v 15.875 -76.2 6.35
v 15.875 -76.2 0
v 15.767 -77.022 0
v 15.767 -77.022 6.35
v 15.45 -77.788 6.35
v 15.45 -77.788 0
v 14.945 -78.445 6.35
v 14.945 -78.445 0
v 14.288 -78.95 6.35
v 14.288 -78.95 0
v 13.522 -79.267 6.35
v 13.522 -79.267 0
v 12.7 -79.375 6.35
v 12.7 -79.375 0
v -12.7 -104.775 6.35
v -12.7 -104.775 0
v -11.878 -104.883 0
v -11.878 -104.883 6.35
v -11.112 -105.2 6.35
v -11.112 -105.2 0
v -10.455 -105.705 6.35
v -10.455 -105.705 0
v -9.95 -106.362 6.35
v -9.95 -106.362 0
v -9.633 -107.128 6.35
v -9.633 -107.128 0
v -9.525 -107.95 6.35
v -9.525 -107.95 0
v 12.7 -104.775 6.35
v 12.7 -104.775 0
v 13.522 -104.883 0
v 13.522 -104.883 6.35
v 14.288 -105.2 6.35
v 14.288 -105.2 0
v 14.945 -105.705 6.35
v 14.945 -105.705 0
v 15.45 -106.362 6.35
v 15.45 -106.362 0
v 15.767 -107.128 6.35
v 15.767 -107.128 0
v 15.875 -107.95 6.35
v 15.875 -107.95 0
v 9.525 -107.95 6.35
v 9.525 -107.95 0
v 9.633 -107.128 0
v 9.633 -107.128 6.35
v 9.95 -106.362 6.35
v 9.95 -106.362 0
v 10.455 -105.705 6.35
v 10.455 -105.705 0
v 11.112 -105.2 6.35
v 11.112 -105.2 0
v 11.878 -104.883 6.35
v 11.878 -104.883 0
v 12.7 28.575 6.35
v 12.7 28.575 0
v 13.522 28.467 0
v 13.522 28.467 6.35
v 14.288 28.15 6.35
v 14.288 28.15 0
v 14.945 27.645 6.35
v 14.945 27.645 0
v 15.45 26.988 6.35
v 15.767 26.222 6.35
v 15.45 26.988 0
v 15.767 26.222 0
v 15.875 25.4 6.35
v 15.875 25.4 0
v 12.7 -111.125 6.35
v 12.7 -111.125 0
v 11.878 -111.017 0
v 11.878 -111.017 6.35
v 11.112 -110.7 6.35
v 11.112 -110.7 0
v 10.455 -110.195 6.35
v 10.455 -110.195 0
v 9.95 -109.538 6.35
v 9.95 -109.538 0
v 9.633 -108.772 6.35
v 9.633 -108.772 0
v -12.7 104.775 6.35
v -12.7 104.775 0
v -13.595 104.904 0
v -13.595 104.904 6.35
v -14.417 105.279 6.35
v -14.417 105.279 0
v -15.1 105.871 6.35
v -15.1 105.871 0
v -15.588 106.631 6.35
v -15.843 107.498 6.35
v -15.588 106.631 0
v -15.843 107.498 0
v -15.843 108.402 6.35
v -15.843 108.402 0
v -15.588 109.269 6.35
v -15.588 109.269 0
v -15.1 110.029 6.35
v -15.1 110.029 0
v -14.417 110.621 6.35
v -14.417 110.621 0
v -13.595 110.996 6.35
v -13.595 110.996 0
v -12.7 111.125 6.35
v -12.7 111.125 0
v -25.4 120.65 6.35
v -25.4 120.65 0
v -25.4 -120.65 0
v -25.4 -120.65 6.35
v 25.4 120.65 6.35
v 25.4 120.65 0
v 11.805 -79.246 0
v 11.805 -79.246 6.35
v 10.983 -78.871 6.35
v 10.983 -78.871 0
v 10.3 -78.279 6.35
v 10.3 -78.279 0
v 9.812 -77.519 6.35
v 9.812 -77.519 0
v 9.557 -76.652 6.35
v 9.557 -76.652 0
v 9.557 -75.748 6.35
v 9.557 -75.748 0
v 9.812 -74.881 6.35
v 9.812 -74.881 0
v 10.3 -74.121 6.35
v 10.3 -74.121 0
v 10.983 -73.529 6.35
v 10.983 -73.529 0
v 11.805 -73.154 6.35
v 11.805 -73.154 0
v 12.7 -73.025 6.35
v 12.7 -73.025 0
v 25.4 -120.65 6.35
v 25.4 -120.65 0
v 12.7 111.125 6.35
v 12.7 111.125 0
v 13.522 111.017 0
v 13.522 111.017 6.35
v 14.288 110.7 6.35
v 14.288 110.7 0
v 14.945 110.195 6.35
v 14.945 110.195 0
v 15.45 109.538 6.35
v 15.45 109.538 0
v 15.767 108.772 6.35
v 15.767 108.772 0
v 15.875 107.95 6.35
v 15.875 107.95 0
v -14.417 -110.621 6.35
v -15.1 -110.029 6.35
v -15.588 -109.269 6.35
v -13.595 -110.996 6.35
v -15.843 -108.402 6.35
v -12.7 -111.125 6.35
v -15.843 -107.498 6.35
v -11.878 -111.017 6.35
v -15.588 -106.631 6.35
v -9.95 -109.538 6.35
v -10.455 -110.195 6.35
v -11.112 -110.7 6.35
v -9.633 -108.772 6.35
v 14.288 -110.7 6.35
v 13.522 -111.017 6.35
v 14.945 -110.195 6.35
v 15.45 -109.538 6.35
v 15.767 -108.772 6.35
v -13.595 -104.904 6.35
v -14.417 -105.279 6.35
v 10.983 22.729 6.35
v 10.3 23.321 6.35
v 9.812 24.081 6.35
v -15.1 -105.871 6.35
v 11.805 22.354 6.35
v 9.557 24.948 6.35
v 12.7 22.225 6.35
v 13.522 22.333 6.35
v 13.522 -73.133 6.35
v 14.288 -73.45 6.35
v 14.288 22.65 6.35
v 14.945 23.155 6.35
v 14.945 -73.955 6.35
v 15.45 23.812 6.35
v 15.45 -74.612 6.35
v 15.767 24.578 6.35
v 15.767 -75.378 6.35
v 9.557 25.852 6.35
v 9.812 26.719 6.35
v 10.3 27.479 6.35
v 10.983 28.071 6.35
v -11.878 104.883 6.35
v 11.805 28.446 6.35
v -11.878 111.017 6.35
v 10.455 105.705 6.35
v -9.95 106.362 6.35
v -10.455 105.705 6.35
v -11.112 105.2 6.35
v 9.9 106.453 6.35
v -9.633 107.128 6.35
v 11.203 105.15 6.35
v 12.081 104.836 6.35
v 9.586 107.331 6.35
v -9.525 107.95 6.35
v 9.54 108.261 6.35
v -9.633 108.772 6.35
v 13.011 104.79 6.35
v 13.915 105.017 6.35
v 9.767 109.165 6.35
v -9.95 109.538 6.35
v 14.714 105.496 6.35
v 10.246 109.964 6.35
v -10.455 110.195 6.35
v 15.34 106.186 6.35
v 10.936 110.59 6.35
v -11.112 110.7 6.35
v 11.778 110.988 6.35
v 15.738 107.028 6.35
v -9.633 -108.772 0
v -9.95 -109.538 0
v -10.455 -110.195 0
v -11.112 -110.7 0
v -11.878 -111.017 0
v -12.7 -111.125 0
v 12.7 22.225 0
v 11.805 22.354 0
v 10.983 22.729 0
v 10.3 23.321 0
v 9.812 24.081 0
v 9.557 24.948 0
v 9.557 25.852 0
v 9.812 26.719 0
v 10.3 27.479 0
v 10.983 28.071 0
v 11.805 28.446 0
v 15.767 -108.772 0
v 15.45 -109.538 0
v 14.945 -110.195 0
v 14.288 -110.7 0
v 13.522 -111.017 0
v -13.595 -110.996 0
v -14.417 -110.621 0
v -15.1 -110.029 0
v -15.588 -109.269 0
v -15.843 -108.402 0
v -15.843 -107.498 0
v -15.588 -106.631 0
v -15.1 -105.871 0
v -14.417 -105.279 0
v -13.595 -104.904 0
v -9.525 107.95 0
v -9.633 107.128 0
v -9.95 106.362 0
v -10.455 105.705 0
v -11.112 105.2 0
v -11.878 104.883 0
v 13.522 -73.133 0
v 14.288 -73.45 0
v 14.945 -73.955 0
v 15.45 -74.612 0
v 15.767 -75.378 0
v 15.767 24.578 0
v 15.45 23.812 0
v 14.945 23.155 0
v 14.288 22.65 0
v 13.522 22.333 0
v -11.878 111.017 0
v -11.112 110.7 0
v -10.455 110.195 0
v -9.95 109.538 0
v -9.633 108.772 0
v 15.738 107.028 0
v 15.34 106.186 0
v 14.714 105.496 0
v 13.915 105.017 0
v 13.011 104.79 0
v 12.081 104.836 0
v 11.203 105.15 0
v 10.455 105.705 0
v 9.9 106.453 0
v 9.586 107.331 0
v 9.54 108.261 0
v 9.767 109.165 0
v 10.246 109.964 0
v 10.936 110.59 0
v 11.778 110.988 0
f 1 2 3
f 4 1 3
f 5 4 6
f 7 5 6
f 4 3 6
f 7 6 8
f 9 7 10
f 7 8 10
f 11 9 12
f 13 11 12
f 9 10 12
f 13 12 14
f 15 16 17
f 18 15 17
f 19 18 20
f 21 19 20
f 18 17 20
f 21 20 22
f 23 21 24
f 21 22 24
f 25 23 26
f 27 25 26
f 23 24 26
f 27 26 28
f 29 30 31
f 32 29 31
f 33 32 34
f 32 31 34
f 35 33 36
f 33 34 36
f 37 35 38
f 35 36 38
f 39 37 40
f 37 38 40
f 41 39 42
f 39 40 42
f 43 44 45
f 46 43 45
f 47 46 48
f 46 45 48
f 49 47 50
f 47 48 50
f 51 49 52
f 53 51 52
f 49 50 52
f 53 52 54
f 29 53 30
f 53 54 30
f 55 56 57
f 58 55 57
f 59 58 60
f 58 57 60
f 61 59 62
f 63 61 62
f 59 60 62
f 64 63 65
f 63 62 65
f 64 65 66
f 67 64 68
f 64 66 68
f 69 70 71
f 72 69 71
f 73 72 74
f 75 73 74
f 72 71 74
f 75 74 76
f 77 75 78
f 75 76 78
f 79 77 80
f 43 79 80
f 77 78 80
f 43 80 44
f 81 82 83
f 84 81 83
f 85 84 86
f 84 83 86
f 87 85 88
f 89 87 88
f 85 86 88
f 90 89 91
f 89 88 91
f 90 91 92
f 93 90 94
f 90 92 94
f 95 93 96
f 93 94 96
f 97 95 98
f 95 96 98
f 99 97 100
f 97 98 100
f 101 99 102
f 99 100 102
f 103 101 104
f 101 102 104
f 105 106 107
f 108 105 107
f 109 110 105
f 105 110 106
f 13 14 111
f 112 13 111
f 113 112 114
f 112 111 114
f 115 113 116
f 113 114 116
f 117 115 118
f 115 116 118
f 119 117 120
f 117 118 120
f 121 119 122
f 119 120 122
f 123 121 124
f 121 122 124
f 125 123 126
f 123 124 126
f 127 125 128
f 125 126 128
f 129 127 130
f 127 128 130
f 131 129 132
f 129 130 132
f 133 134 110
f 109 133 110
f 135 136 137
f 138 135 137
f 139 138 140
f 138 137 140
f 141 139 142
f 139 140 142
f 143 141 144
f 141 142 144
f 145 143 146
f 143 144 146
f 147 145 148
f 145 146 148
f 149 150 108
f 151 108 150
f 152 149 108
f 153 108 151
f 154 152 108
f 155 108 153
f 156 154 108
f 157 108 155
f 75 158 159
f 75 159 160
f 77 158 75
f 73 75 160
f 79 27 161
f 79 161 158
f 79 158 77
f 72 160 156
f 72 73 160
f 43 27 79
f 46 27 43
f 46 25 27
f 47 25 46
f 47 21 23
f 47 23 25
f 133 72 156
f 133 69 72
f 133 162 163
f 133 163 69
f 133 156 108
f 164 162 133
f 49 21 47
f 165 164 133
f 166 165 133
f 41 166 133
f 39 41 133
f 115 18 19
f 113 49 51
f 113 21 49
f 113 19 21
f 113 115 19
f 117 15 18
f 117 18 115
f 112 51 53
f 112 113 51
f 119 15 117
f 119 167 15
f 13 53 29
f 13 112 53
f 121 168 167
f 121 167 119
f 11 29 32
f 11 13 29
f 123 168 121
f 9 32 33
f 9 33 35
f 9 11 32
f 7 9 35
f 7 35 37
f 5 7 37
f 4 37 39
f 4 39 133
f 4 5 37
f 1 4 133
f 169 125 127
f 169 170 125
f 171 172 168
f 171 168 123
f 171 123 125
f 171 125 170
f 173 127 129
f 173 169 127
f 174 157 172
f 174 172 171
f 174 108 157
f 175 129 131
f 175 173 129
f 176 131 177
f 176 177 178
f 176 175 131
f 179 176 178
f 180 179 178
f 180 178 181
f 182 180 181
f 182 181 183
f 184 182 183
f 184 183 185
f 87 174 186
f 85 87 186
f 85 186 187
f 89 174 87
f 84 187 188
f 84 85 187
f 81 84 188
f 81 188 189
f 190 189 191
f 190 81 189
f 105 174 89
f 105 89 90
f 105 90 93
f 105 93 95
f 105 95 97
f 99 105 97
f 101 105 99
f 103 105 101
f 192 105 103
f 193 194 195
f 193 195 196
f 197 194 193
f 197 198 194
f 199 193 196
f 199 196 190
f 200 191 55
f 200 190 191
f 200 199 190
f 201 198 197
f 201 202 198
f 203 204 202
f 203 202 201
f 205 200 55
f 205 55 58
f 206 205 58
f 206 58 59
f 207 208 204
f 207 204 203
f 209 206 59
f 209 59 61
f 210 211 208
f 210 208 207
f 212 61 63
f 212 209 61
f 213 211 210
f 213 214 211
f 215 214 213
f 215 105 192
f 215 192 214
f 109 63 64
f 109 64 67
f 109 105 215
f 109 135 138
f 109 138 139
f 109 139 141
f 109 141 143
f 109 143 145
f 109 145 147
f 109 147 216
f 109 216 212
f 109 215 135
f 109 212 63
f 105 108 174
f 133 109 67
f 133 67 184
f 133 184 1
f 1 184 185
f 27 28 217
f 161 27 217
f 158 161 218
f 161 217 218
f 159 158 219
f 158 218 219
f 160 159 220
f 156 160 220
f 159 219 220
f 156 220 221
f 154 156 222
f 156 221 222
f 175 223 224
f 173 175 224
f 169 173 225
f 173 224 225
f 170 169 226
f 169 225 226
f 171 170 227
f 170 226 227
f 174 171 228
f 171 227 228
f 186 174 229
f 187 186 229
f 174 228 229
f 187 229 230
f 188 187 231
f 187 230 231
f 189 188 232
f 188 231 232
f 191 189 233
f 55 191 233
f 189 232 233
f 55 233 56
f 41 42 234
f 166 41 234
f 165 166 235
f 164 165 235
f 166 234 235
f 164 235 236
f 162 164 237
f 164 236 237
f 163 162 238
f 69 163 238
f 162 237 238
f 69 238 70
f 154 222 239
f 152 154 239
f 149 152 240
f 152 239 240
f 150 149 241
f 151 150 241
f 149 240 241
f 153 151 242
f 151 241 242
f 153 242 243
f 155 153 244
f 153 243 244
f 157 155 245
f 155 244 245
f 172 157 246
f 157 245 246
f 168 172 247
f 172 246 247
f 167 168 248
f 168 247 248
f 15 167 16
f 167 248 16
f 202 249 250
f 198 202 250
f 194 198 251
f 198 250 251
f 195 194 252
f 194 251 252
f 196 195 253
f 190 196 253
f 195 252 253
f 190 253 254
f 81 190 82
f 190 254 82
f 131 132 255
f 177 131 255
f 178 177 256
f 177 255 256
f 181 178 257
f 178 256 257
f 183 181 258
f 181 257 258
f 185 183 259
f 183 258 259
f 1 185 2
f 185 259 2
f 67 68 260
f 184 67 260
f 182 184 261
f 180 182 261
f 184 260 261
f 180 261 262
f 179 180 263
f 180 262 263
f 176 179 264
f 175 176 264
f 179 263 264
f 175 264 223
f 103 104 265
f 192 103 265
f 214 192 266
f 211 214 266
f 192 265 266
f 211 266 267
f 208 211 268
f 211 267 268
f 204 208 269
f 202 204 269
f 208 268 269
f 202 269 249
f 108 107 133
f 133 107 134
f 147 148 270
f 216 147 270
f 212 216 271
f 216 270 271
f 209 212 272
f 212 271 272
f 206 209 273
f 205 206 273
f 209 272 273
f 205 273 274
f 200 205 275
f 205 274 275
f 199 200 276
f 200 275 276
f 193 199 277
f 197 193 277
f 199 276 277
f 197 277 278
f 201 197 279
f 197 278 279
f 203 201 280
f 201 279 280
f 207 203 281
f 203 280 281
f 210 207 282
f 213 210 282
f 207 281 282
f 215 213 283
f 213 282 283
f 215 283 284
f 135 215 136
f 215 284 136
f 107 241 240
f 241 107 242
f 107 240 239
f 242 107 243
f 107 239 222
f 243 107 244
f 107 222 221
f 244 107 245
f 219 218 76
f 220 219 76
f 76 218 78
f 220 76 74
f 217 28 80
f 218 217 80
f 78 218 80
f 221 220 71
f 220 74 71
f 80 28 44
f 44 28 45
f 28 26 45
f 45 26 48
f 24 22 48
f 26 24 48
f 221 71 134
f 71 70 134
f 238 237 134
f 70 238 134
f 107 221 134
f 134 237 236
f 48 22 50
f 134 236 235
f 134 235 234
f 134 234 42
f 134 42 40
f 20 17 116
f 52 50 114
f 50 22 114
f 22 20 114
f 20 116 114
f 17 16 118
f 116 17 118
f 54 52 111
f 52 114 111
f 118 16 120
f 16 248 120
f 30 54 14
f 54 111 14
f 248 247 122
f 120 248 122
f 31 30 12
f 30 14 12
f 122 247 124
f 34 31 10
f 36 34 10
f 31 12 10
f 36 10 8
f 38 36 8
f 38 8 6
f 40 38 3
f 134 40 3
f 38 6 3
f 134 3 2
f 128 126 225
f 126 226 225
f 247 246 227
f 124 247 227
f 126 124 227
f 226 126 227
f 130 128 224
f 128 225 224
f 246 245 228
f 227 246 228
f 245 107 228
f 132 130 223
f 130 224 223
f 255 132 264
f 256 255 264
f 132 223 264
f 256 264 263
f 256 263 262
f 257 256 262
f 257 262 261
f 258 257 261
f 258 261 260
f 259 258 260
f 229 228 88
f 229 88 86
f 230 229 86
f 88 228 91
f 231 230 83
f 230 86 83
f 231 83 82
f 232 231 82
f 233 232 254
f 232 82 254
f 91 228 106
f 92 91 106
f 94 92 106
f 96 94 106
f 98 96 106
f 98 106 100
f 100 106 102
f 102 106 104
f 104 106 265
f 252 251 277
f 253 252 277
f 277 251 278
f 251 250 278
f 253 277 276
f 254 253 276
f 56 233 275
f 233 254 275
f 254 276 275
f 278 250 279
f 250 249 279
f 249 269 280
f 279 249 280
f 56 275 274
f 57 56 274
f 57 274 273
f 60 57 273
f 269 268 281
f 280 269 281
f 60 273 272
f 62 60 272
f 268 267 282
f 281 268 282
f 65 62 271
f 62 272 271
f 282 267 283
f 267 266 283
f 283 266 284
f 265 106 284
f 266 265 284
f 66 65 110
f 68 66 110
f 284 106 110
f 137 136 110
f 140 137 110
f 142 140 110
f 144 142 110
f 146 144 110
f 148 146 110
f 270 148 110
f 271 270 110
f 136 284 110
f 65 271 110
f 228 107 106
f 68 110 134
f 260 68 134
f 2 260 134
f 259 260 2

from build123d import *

# Parameters (mm, degrees)
F1_DEPTH = 6.35


with BuildPart() as f1:
    # F0 (on Top) → F1 (new body)
    with BuildSketch(Plane.XY):
        with BuildLine():
            Line((-12.7, 111.125), (-12.7, 120.65))
            Line((-12.7, 120.65), (-25.4, 120.65))
            Line((-25.4, 120.65), (-25.4, -120.65))
            Line((-25.4, -120.65), (-12.7, -120.65))
            Line((-12.7, -120.65), (-12.7, -111.125))
            ThreePointArc((-12.7, -111.125), (-15.875, -107.95), (-12.7, -104.775))
            Line((-12.7, -104.775), (-12.7, 104.775))
            ThreePointArc((-12.7, 104.775), (-15.875, 107.95), (-12.7, 111.125))
        make_face()
        with BuildLine():
            Line((25.4, -107.95), (25.4, 120.65))
            Line((25.4, 120.65), (12.7, 120.65))
            Line((12.7, 120.65), (-12.7, 120.65))
            Line((-12.7, 120.65), (-12.7, 111.125))
            ThreePointArc((-12.7, 111.125), (-10.4549359697, 110.1950640303), (-9.525, 107.95))
            ThreePointArc((-9.525, 107.95), (-10.4549359697, 105.7049359697), (-12.7, 104.775))
            Line((-12.7, 104.775), (-12.7, -104.775))
            ThreePointArc((-12.7, -104.775), (-10.4549359697, -105.7049359697), (-9.525, -107.95))
            Line((-9.525, -107.95), (9.525, -107.95))
            ThreePointArc((9.525, -107.95), (10.4549359697, -105.7049359697), (12.7, -104.775))
            ThreePointArc((12.7, -104.775), (14.9450640303, -105.7049359697), (15.875, -107.95))
            Line((15.875, -107.95), (25.4, -107.95))
        make_face()
        with BuildLine():
            ThreePointArc((15.875, -76.2), (14.9450640303, -78.4450640303), (12.7, -79.375))
            ThreePointArc((12.7, -79.375), (9.525, -76.2), (12.7, -73.025))
            ThreePointArc((12.7, -73.025), (14.9450640303, -73.9549359697), (15.875, -76.2))
        make_face(mode=Mode.SUBTRACT)
        with BuildLine():
            ThreePointArc((15.875, 25.4), (14.9450640303, 23.1549359697), (12.7, 22.225))
            ThreePointArc((12.7, 22.225), (9.525, 25.4), (12.7, 28.575))
            ThreePointArc((12.7, 28.575), (14.9450640303, 27.6450640303), (15.875, 25.4))
        make_face(mode=Mode.SUBTRACT)
        with BuildLine():
            ThreePointArc((15.875, 107.95), (10.4549359697, 105.7049359697), (12.7, 111.125))
            ThreePointArc((12.7, 111.125), (14.9450640303, 110.1950640303), (15.875, 107.95))
        make_face(mode=Mode.SUBTRACT)
        with BuildLine():
            Line((-12.7, -120.65), (12.7, -120.65))
            Line((12.7, -120.65), (12.7, -111.125))
            ThreePointArc((12.7, -111.125), (10.4549359697, -110.1950640303), (9.525, -107.95))
            Line((9.525, -107.95), (-9.525, -107.95))
            ThreePointArc((-9.525, -107.95), (-10.4549359697, -110.1950640303), (-12.7, -111.125))
            Line((-12.7, -111.125), (-12.7, -120.65))
        make_face()
        with BuildLine():
            Line((25.4, -120.65), (25.4, -107.95))
            Line((25.4, -107.95), (15.875, -107.95))
            ThreePointArc((15.875, -107.95), (14.9450640303, -110.1950640303), (12.7, -111.125))
            Line((12.7, -111.125), (12.7, -120.65))
            Line((12.7, -120.65), (25.4, -120.65))
        make_face()
    extrude(amount=F1_DEPTH)


solid = f1.part
